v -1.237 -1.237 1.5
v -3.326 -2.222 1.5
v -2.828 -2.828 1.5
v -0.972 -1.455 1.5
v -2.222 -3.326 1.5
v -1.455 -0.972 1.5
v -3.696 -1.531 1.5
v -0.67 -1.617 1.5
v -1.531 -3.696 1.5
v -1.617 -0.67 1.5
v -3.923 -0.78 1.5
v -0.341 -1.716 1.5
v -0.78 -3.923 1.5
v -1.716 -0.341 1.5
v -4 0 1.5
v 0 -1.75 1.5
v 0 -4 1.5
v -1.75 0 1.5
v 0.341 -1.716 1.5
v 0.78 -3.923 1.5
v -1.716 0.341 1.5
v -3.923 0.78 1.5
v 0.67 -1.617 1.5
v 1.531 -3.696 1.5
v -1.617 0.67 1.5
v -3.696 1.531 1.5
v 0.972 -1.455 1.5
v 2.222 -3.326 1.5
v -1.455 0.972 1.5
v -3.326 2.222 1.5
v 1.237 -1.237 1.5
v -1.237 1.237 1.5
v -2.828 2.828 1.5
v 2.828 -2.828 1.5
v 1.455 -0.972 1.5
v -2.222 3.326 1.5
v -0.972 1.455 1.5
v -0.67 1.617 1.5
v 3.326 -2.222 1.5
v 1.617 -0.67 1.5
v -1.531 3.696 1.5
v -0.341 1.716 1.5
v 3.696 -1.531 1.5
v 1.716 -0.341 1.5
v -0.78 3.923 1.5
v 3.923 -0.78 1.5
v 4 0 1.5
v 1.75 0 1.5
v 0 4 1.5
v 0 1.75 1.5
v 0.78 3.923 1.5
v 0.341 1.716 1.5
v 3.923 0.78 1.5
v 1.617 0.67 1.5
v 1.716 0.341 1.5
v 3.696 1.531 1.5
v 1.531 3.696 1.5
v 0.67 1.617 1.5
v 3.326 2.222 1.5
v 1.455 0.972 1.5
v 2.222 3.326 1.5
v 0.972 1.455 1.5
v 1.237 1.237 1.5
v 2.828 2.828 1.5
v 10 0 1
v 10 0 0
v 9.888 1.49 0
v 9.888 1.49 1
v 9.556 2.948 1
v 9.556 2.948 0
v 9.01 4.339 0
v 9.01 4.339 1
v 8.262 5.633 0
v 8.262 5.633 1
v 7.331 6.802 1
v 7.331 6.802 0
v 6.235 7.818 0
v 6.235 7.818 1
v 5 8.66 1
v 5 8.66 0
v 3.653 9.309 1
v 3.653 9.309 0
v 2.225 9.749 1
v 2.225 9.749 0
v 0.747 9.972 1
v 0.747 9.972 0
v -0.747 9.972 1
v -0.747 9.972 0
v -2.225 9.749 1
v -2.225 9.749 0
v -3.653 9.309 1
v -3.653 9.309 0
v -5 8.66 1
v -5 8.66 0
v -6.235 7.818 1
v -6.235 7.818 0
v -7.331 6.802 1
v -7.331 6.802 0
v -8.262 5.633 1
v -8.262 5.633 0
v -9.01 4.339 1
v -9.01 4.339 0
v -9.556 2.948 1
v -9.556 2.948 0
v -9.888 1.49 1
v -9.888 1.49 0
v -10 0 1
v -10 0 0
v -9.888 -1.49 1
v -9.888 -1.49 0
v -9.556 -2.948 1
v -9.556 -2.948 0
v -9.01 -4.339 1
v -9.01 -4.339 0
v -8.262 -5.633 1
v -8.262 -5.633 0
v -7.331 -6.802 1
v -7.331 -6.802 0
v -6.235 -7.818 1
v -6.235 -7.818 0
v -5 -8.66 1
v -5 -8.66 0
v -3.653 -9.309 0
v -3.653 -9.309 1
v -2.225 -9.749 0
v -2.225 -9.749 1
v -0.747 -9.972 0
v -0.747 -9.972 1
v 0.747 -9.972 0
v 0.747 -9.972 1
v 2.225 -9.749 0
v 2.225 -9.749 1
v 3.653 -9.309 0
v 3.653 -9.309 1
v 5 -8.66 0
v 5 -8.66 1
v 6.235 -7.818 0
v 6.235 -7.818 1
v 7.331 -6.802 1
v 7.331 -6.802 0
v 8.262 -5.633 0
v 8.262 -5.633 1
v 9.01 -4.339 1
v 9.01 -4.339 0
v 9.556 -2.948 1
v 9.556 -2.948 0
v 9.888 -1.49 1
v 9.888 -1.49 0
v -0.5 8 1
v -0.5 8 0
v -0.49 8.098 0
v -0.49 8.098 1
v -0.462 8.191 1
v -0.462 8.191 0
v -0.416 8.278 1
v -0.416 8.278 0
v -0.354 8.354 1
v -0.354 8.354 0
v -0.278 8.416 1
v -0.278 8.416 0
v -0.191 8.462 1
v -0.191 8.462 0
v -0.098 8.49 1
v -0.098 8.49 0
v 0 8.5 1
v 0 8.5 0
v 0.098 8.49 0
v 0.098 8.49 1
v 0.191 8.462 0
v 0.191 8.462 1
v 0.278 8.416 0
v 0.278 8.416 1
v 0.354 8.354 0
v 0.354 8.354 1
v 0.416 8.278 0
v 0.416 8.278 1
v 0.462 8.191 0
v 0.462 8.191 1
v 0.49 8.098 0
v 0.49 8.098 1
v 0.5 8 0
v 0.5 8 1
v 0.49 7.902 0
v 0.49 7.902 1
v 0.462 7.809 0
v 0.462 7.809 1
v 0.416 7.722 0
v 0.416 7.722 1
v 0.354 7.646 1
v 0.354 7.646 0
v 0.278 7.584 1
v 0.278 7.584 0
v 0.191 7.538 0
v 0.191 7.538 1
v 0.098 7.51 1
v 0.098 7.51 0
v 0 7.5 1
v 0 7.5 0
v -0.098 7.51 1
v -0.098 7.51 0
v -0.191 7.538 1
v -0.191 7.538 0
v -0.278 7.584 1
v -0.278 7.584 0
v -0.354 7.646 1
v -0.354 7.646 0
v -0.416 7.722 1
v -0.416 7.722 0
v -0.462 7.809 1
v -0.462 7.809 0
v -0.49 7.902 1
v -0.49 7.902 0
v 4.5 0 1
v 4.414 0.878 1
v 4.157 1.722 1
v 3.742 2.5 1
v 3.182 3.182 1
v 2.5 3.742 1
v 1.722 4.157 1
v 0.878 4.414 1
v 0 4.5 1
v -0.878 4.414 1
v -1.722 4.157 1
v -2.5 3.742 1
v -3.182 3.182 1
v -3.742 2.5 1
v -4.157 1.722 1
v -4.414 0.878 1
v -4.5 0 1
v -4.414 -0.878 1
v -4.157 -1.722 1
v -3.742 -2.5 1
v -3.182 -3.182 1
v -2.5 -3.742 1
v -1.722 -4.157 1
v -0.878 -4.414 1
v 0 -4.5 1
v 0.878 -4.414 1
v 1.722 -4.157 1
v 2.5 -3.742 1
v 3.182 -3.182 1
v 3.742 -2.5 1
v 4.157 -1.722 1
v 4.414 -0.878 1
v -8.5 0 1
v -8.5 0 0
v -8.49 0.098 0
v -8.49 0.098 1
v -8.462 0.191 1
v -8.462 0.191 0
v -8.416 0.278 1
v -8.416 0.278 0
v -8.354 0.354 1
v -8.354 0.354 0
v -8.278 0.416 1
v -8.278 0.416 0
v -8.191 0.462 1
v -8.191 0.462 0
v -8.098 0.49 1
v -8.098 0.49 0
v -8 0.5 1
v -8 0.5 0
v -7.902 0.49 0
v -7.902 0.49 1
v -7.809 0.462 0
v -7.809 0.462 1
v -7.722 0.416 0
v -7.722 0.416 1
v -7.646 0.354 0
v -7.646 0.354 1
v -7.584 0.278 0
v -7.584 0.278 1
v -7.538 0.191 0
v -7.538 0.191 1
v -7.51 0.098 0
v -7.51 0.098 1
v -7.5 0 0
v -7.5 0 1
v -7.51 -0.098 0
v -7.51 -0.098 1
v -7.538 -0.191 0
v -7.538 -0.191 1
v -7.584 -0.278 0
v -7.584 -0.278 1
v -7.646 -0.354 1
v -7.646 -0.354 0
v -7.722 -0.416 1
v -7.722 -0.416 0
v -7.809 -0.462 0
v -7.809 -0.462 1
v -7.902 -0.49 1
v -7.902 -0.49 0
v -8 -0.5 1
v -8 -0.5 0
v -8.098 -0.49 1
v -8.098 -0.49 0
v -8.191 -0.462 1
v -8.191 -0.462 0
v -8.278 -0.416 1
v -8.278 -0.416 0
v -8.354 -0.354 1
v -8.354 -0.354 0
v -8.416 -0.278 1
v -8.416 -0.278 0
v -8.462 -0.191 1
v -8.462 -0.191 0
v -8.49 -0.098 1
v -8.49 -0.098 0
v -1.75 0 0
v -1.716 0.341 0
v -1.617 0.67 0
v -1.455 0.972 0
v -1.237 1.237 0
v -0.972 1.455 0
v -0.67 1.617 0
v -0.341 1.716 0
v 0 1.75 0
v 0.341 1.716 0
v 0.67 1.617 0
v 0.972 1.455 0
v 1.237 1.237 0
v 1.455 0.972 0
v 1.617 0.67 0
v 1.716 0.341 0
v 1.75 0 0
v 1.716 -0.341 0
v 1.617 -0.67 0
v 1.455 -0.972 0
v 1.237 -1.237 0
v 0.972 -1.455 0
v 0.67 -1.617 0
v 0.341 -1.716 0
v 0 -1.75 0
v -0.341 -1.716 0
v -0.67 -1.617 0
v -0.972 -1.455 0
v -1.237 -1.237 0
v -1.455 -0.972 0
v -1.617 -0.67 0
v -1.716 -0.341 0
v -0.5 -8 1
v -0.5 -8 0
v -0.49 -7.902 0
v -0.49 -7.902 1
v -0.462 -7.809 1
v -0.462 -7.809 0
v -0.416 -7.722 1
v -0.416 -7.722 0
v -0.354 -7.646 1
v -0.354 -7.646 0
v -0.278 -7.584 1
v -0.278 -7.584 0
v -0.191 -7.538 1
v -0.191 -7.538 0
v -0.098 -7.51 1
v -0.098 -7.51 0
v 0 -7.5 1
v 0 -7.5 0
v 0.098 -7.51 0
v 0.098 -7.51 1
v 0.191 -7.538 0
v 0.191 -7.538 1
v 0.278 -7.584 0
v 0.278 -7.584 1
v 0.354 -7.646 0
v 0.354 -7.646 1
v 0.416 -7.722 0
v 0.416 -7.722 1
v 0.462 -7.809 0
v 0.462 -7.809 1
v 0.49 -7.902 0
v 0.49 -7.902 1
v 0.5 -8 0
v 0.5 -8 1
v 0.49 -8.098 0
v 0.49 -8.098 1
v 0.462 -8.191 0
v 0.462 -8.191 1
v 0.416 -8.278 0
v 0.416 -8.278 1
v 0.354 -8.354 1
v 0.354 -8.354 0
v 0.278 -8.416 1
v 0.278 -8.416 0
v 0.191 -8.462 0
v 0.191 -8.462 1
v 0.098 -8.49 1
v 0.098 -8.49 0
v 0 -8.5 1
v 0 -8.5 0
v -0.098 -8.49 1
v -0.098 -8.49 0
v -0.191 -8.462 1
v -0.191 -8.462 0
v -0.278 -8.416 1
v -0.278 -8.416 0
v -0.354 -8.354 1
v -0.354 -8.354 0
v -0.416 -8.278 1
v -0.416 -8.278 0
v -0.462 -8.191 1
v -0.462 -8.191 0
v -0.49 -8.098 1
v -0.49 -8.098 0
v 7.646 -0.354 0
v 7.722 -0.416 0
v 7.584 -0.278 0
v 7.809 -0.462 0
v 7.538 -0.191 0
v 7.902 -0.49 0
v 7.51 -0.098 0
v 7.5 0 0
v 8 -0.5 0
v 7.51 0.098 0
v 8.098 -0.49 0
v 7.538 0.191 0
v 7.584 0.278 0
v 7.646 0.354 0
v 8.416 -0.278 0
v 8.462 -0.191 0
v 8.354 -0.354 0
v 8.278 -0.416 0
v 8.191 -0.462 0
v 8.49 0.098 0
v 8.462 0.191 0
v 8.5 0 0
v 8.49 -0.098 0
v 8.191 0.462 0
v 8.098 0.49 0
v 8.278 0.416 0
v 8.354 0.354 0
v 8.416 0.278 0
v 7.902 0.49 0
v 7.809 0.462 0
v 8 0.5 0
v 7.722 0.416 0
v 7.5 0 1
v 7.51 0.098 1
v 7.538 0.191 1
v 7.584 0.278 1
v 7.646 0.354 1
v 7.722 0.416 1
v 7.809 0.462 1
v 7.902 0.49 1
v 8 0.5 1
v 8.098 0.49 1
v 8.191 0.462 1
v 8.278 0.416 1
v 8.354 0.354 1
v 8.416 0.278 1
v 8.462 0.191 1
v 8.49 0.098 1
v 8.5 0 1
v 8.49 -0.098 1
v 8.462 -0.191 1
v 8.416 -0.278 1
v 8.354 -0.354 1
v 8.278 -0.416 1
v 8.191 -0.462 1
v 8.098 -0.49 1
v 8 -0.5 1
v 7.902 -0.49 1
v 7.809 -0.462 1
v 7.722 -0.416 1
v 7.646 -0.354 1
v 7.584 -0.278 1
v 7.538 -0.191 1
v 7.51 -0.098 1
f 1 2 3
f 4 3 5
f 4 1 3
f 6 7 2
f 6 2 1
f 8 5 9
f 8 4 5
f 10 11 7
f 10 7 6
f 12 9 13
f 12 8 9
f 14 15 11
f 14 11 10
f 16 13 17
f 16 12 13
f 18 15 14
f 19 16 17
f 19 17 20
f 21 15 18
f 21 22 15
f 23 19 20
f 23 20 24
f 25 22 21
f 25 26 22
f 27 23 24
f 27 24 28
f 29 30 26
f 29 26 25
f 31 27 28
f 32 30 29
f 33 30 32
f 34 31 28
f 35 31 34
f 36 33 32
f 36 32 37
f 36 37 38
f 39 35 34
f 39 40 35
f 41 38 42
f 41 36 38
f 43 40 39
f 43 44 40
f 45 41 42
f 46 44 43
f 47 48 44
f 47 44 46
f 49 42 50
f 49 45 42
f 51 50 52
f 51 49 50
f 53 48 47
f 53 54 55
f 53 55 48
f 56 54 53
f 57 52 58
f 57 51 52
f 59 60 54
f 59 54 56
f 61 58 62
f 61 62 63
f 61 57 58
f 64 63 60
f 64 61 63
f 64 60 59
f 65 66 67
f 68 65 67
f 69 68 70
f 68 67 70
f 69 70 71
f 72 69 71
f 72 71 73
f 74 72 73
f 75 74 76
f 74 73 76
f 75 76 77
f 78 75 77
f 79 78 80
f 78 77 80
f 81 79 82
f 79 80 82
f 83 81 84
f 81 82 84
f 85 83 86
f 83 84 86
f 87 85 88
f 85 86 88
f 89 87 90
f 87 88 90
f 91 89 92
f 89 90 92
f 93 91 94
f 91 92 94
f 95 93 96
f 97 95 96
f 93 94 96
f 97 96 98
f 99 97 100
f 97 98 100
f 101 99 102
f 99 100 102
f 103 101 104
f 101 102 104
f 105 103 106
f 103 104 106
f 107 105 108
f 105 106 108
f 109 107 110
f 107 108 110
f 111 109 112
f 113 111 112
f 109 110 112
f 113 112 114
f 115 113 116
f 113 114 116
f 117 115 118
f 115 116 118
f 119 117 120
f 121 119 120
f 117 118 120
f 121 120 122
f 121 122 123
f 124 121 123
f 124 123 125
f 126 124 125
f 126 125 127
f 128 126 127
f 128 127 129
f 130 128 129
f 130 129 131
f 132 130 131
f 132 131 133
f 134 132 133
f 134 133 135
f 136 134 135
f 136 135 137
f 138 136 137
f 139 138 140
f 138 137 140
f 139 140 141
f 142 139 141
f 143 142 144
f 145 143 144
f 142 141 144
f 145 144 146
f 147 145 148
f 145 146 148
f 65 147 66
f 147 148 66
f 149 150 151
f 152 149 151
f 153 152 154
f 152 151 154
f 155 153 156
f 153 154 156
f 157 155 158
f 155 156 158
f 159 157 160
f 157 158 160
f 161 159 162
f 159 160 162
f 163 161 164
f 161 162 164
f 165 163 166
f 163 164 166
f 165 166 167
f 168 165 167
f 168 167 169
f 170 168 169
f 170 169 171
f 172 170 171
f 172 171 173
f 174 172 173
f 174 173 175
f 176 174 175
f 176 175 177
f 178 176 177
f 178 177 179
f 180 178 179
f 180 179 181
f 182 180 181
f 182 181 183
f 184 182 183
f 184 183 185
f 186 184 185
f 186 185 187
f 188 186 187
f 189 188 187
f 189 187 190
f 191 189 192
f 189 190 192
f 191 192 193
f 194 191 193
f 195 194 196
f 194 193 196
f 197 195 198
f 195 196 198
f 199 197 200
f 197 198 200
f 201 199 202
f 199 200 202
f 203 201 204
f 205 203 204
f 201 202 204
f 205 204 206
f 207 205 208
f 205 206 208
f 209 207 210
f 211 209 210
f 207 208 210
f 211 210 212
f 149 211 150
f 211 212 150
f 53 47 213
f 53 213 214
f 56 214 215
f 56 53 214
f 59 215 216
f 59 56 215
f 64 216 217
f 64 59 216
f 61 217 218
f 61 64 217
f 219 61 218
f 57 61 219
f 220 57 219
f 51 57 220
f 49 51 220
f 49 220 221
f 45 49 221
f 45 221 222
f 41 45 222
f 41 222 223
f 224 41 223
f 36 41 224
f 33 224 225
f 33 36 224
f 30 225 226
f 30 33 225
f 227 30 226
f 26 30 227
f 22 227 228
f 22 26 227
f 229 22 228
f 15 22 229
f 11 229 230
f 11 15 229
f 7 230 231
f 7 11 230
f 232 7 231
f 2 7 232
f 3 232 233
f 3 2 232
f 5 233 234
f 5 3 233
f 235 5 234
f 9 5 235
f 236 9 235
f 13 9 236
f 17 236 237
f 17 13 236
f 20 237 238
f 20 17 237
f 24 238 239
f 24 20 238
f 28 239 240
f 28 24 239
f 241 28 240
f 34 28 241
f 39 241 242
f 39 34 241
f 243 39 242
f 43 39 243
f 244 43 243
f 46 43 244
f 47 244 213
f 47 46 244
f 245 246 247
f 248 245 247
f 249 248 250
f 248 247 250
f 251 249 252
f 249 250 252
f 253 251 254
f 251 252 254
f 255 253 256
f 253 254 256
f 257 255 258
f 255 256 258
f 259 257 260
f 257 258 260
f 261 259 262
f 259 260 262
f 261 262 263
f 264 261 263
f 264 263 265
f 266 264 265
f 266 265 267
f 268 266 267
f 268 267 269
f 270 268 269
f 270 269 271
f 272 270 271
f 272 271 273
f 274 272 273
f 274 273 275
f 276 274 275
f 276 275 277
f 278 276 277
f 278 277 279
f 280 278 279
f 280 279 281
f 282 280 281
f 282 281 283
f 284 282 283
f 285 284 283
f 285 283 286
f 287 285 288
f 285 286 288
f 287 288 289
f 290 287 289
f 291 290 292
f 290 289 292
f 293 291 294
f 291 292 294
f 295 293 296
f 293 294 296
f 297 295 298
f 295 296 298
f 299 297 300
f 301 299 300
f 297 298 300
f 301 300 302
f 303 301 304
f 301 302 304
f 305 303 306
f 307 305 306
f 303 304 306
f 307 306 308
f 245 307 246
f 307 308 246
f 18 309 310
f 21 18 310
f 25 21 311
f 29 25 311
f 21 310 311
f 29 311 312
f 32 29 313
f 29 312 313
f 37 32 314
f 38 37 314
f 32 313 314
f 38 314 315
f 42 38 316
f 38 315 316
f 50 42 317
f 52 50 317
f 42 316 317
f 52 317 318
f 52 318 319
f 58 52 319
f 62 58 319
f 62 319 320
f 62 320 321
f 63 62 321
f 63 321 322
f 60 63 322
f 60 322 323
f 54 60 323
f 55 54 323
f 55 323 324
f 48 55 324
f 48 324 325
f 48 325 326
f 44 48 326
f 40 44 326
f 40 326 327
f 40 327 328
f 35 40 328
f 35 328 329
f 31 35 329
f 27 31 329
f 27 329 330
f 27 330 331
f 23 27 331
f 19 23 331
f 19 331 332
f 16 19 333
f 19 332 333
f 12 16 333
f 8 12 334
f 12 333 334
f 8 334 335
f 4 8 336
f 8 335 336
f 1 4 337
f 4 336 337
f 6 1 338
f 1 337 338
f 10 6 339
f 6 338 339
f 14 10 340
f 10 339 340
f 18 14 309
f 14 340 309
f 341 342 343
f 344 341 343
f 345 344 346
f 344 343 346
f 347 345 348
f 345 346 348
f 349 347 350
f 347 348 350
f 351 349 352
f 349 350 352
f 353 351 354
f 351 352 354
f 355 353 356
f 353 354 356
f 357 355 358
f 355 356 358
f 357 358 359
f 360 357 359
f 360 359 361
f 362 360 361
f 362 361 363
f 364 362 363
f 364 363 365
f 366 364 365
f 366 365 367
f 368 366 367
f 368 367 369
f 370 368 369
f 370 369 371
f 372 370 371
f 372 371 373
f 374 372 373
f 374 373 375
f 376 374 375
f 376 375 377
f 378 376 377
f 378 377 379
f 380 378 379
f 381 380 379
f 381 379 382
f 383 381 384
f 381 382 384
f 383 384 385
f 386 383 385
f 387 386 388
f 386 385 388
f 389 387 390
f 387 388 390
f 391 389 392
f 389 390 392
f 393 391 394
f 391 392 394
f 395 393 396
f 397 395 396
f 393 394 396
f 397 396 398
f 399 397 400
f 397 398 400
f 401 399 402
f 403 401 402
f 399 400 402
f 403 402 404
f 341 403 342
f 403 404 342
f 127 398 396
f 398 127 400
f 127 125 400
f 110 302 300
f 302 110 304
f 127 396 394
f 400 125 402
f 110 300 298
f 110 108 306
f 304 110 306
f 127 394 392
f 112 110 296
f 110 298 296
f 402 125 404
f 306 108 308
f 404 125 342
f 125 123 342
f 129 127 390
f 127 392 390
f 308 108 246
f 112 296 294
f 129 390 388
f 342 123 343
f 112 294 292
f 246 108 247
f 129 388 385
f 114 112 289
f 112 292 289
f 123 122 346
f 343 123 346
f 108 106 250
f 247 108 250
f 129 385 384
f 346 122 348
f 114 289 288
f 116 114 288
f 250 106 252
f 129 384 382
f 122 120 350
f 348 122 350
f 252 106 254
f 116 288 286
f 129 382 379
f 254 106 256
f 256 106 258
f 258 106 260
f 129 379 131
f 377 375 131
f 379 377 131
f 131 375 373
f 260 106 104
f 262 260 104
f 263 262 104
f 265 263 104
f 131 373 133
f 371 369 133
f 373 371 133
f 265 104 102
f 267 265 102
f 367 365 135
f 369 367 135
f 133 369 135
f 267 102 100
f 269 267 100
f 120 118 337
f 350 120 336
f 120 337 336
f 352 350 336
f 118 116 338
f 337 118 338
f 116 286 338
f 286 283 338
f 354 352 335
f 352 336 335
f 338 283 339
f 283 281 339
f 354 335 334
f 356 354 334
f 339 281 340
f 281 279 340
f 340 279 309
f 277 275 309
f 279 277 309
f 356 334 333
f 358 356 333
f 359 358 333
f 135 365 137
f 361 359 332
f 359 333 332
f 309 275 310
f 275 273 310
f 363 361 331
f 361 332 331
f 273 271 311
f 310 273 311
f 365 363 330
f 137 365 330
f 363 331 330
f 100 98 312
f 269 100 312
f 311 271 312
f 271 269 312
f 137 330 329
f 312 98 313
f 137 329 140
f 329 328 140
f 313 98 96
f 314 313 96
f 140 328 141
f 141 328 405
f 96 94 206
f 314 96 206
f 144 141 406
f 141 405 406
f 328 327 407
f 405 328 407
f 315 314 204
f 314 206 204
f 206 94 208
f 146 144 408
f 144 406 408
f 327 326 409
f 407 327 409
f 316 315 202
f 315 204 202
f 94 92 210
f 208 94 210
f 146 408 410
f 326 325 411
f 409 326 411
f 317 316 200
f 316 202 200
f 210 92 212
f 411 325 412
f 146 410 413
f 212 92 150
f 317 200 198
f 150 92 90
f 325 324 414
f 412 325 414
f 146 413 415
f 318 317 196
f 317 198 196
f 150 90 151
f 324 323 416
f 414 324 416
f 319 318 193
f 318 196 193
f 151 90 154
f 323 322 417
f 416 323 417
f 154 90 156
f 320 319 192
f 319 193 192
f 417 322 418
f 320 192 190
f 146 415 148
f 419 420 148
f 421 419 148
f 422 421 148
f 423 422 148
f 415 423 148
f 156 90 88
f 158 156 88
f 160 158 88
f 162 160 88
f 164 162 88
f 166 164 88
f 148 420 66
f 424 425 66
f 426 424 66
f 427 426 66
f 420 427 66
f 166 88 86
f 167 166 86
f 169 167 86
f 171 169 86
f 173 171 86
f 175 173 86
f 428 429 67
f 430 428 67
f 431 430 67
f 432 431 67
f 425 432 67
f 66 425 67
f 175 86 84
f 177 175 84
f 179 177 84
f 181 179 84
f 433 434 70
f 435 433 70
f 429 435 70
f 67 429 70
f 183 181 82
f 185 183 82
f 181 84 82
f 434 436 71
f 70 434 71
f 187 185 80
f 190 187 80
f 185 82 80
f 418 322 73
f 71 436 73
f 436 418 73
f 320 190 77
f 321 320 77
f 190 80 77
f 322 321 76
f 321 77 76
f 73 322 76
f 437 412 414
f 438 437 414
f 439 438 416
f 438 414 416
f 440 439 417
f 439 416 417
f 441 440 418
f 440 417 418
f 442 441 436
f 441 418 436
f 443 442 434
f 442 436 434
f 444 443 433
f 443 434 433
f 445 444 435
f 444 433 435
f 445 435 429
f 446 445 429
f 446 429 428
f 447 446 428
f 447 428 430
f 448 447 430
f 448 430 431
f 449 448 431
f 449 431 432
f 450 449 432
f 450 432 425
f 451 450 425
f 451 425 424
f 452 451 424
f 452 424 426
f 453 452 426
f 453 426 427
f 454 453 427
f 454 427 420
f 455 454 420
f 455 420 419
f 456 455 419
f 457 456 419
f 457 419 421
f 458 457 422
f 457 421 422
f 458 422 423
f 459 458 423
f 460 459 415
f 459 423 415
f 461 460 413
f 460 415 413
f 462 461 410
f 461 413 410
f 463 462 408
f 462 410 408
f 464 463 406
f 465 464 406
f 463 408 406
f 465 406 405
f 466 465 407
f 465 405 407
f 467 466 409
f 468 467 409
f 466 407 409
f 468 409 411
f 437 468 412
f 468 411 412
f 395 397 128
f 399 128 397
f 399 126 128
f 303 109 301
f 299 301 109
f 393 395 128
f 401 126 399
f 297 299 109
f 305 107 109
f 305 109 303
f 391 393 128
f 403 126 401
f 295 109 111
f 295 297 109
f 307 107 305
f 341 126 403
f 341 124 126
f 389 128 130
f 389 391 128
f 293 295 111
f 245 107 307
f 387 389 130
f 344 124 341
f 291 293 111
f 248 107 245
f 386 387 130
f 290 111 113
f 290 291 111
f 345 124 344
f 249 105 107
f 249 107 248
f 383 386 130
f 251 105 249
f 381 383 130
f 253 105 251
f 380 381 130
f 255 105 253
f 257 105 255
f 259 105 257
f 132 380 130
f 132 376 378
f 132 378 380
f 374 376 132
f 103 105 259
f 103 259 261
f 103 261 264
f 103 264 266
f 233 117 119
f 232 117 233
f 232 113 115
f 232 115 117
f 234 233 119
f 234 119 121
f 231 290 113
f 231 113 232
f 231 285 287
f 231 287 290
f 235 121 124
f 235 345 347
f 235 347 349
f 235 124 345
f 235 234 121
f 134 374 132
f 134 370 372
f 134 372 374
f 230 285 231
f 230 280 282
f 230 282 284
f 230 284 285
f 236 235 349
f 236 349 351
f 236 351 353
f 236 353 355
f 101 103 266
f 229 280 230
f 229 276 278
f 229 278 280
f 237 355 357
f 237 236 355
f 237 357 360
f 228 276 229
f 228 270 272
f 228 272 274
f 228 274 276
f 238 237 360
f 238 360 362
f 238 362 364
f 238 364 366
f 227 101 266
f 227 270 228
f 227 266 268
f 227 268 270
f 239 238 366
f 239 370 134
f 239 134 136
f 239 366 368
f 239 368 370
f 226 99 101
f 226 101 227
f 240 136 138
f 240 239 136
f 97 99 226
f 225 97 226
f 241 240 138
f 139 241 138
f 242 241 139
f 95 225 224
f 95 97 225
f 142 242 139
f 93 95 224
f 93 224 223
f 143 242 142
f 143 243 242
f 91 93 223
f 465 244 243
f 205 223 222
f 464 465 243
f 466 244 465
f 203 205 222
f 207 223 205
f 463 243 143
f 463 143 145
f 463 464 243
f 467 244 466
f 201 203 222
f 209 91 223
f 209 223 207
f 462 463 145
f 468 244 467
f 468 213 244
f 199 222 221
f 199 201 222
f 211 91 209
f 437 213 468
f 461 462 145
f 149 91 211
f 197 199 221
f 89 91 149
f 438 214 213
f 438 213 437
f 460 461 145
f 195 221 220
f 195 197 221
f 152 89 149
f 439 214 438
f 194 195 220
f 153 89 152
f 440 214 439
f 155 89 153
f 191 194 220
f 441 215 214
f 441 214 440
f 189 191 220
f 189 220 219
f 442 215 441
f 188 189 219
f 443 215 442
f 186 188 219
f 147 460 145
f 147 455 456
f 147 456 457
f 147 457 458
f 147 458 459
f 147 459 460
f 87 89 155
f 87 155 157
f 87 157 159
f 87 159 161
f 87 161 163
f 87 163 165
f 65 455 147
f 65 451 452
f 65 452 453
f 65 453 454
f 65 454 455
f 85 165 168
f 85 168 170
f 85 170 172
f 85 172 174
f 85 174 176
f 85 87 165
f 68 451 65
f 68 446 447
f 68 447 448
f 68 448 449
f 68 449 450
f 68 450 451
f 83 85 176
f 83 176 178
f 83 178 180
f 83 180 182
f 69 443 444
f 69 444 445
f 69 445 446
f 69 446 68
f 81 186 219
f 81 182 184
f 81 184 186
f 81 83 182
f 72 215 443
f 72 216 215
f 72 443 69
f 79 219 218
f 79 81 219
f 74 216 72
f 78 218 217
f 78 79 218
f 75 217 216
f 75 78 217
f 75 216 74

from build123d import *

# Parameters (mm, degrees)
SKETCH_1_R          = 10
EXTRUDE_1_DEPTH     = 1
SKETCH_2_R          = 4.5
EXTRUDE_2_DEPTH     = 0.5
CHAMFER_1_SIZE      = 0.5
SKETCH_3_R          = 1.75
CUT_EXTRUDE_1_DEPTH = 15.221462653
SKETCH_4_R          = 0.5
CUT_EXTRUDE_2_DEPTH = 15.221462653


with BuildPart() as part:
    # 草图1 → 凸台-拉伸1 (new body)
    with BuildSketch(Plane.XY):
        Circle(SKETCH_1_R)
    extrude(amount=EXTRUDE_1_DEPTH)

    # 草图2 → 凸台-拉伸2 (add)
    with BuildSketch(Plane.XY.offset(1)):
        Circle(SKETCH_2_R)
    extrude(amount=EXTRUDE_2_DEPTH)

    # 倒角1
    chamfer_1_edges = [part.edges().sort_by_distance(p)[0] for p in [
        (-4.5, 0, 1.5),
    ]]
    chamfer(chamfer_1_edges, length=CHAMFER_1_SIZE - 0.0001)  # a hair under: the kernel refuses the full size

    # 草图3 → 切除-拉伸1 (cut, through all)
    with BuildSketch(Plane(origin=(0, 0, 0), x_dir=(-1, 0, 0), z_dir=(0, 0, -1))):
        Circle(SKETCH_3_R)
    extrude(amount=-CUT_EXTRUDE_1_DEPTH, mode=Mode.SUBTRACT)

    # 草图4 → 切除-拉伸2 (cut, through all)
    with BuildSketch(Plane(origin=(0, 0, 0), x_dir=(-1, 0, 0), z_dir=(0, 0, -1))):
        with Locations((0, 8)):
            Circle(SKETCH_4_R)
        with Locations((8, 0)):
            Circle(SKETCH_4_R)
        with Locations((0, -8)):
            Circle(SKETCH_4_R)
        with Locations((-8, 0)):
            Circle(SKETCH_4_R)
    extrude(amount=-CUT_EXTRUDE_2_DEPTH, mode=Mode.SUBTRACT)


solid = part.part
